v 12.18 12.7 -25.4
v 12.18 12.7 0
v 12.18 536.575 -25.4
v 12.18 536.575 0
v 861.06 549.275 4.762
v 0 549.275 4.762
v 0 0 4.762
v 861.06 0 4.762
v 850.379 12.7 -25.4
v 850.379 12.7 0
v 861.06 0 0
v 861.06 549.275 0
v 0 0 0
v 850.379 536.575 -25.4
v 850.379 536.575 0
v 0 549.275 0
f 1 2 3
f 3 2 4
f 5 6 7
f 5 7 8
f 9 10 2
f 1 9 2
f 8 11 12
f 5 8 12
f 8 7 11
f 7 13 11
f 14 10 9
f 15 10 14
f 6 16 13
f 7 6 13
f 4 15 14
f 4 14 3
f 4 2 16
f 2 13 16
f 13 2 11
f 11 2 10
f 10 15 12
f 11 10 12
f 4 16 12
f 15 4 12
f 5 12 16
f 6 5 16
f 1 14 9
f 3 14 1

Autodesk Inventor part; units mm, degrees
ref_plane "YZ Plane" through (0, 0, 0) normal (1, 0, 0) x (0, 1, 0)
ref_plane "XZ Plane" through (0, 0, 0) normal (0, 1, 0) x (-1, 0, 0)
ref_plane "XY Plane" through (0, 0, 0) normal (0, 0, 1) x (1, 0, 0)
sketch "Sketch1" plane through (0, 0, 0) normal (0, 0, 1) x (1, 0, 0)
  line L0 (0, 0) -> (861.06, 0)
  line L1 (861.06, 0) -> (861.06, 549.275)
  line L2 (861.06, 549.275) -> (0, 549.275)
  line L3 (0, 549.275) -> (0, 0)
  dimension "d2" = 861.06
  dimension "d3" = 549.275
extrude "Extrusion1" add sketch "Sketch1" along normal blind 4.7625
sketch "Sketch2" plane through (0, 0, 0) normal (0, 0, -1) x (-1, 0, 0)
  line L0 (-888.4793, 12.7) -> (25.9207, 12.7) projected
  line L1 (-12.1803, 12.7) -> (-12.1803, 536.575) projected
  line L2 (-850.3793, 12.7) -> (-850.3793, 536.575) projected
  line L3 (-888.4793, 536.575) -> (25.9207, 536.575) projected
  line L4 (-12.1803, 536.575) -> (-850.3793, 536.575)
  line L5 (-850.3793, 536.575) -> (-850.3793, 12.7)
  line L6 (-850.3793, 12.7) -> (-12.1803, 12.7)
  line L7 (-12.1803, 12.7) -> (-12.1803, 536.575)
  point P0 (0, 0)
extrude "Extrusion2" add sketch "Sketch2" along normal blind 25.4
properties part number "gatorboard_01875in"
